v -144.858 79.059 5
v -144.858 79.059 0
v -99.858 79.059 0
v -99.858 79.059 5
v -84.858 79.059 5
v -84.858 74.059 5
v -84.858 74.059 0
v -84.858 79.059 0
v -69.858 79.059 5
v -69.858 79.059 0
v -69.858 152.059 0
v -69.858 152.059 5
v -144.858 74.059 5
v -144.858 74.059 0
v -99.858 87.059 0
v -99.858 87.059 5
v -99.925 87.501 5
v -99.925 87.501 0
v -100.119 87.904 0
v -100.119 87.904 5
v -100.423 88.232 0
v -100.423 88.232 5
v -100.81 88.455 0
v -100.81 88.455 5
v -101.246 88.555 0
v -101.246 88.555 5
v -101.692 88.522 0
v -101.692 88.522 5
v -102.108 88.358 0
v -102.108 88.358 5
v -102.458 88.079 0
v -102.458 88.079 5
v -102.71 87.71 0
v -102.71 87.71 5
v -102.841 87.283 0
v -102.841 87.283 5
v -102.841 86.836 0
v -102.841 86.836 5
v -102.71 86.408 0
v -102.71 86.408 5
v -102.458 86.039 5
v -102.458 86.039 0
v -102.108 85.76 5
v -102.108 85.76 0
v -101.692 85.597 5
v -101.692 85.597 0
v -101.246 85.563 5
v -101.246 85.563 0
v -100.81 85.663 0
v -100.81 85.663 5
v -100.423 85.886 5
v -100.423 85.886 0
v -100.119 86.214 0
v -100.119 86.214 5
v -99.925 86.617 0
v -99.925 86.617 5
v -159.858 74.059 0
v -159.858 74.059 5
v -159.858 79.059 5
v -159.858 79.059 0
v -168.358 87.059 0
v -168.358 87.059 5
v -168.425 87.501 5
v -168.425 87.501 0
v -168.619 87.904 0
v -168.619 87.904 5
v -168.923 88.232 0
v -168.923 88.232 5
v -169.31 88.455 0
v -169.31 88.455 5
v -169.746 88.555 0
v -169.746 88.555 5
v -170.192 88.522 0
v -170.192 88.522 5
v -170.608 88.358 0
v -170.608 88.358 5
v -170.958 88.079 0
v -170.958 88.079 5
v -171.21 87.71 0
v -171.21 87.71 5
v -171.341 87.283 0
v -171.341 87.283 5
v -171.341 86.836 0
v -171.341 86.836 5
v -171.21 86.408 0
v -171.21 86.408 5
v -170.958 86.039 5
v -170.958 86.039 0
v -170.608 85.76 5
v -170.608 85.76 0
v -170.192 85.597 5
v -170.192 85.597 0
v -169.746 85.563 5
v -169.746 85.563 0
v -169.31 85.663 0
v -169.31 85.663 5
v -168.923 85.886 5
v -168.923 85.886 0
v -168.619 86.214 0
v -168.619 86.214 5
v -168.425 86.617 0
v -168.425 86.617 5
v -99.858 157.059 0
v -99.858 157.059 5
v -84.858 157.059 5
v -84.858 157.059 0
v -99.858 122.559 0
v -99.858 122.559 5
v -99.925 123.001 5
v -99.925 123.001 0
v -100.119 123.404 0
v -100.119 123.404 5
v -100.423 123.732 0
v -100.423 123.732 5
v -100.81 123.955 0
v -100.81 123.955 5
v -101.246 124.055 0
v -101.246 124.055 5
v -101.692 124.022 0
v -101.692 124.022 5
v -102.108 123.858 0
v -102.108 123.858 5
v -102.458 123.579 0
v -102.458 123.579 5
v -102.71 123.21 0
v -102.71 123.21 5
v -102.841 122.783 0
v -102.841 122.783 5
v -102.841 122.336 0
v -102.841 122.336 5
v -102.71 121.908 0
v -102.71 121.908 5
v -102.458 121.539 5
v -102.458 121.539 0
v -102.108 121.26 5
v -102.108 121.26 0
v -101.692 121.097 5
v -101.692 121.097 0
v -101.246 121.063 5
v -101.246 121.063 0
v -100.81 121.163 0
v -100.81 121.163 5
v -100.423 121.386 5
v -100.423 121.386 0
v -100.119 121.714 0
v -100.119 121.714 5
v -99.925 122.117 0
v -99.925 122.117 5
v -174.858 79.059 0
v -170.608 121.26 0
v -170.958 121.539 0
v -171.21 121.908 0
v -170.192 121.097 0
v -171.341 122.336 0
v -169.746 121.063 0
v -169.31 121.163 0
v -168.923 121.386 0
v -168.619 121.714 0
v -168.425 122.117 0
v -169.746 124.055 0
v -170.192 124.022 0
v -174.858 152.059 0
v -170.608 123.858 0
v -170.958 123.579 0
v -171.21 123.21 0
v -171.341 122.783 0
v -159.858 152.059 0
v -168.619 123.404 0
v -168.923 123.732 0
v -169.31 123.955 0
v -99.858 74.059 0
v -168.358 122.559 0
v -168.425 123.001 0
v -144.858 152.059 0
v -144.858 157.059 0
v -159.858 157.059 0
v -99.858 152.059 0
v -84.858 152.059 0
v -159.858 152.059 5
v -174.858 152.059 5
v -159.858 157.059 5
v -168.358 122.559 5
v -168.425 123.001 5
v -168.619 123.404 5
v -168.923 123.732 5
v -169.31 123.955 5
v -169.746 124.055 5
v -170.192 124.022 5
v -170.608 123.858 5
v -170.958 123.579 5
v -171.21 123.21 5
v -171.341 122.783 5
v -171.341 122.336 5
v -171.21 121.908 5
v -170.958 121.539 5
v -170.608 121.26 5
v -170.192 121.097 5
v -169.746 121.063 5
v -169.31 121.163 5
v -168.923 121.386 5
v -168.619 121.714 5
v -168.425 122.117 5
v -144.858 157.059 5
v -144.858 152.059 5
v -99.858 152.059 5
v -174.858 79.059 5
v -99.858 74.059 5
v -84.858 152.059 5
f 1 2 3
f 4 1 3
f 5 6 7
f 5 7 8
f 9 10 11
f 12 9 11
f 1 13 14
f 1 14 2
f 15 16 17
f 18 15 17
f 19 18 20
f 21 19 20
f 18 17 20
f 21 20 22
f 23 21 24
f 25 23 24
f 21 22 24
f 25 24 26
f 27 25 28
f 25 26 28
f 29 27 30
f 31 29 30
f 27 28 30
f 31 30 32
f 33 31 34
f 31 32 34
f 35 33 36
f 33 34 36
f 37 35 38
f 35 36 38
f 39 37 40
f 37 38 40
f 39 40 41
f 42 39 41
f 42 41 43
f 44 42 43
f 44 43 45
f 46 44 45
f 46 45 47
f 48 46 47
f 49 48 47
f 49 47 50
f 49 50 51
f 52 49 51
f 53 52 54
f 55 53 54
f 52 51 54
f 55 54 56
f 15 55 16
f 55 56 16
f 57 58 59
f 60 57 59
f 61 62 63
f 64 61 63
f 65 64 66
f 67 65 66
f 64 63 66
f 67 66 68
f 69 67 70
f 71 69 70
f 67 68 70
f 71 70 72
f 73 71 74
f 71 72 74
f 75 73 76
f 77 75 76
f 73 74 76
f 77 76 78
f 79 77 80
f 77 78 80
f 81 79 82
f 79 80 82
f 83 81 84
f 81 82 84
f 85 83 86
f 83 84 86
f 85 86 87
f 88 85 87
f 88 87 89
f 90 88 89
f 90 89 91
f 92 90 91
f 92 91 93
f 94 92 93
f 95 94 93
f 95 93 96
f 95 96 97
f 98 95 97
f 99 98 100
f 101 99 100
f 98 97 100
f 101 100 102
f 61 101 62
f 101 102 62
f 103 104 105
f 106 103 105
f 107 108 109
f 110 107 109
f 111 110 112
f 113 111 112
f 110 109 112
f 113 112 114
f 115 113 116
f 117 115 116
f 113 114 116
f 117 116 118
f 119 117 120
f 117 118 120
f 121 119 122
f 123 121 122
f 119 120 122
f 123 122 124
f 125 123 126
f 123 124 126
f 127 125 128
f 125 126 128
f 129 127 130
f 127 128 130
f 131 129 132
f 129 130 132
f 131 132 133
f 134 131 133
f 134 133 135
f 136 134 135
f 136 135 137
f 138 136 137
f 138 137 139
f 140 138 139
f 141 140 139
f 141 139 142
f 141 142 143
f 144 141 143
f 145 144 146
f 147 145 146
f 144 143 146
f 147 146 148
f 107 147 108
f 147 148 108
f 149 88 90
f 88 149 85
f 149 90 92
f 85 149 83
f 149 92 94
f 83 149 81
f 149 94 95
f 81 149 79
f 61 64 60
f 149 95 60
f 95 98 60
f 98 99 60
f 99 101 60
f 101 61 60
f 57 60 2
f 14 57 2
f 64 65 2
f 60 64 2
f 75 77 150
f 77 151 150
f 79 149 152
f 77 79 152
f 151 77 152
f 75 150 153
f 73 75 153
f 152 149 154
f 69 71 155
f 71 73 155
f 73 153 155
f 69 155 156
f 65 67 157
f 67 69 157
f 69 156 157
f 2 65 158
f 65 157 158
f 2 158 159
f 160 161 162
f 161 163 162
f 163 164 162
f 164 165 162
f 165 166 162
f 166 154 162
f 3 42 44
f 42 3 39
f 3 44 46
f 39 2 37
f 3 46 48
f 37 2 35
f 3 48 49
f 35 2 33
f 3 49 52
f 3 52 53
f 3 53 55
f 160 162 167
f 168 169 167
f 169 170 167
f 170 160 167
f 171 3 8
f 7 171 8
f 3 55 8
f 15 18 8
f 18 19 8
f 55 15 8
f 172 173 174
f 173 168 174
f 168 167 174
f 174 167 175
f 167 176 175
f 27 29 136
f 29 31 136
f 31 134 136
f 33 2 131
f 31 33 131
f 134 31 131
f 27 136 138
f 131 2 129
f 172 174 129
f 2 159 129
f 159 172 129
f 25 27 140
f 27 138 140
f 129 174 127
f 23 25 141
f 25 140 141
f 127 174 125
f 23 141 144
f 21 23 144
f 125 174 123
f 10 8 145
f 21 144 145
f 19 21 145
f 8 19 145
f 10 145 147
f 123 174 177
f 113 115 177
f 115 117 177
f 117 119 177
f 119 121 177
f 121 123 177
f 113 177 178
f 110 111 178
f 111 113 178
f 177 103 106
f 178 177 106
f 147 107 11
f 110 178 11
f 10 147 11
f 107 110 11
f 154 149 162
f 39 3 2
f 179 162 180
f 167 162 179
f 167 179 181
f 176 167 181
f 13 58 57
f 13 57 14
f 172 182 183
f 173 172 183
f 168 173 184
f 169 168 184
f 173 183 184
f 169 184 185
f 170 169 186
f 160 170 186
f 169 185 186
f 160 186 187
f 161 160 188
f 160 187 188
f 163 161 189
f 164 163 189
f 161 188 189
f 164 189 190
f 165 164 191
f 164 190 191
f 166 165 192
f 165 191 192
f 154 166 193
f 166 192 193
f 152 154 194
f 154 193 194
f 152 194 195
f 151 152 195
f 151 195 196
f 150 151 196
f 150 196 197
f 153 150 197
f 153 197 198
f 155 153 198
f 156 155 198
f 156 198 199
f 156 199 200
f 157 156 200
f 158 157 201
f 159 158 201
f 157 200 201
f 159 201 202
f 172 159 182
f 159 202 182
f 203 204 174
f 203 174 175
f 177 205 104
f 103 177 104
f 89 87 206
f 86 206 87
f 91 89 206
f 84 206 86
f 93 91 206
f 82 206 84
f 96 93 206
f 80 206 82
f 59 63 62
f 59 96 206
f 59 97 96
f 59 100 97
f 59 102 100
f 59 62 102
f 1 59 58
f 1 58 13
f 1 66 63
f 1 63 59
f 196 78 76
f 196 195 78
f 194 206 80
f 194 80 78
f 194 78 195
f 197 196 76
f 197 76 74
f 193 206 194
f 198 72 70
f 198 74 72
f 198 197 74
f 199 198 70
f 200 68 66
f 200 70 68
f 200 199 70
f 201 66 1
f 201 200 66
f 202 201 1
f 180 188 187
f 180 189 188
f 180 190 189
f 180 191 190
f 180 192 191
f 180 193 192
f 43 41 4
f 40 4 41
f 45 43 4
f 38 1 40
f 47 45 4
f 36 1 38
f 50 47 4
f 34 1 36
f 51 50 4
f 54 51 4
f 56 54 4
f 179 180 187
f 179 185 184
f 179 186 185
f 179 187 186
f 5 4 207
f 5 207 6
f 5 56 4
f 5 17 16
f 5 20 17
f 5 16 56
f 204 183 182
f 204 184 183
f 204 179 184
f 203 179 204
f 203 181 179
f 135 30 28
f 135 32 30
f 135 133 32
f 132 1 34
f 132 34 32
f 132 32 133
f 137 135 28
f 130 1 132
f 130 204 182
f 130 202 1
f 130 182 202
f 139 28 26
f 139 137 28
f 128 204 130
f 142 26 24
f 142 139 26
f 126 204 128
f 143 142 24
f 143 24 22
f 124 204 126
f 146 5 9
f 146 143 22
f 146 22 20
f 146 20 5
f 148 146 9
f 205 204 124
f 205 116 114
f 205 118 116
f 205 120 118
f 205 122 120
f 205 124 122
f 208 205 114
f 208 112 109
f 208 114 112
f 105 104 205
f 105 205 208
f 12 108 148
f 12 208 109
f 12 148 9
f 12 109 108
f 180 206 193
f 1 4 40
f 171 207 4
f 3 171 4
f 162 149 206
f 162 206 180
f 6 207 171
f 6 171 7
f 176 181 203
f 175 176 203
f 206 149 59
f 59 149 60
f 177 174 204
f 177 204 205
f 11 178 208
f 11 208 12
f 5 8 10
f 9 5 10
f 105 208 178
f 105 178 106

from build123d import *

# Parameters (mm, degrees)
ESQUISSE1_W             = 105
ESQUISSE1_H             = 73
BOSS_EXTRU_1_DEPTH      = 5
ESQUISSE2_R             = 1.5
ENL_V_MAT_EXTRU_1_DEPTH = 5
ESQUISSE3_W             = 15
ESQUISSE3_H             = 5
BOSS_EXTRU_2_DEPTH      = 5


with BuildPart() as part:
    # Esquisse1 → Boss.-Extru.1 (new body)
    with BuildSketch(Plane.XY):
        with Locations((-122.358209677, 115.559145013)):
            Rectangle(ESQUISSE1_W, ESQUISSE1_H)
    extrude(amount=BOSS_EXTRU_1_DEPTH)

    # Esquisse2 → Enlèv. mat.-Extru.1 (cut)
    with BuildSketch(Plane.XY.offset(5)):
        with Locations((-101.358209677, 122.559145013)):
            Circle(ESQUISSE2_R)
        with Locations((-169.858209677, 122.559145013)):
            Circle(ESQUISSE2_R)
        with Locations((-169.858209677, 87.059145013)):
            Circle(ESQUISSE2_R)
        with Locations((-101.358209677, 87.059145013)):
            Circle(ESQUISSE2_R)
    extrude(amount=-ENL_V_MAT_EXTRU_1_DEPTH, mode=Mode.SUBTRACT)

    # Esquisse3 → Boss.-Extru.2 (add)
    with BuildSketch(Plane.XY.offset(5)):
        with Locations((-152.358209677, 76.559145013)):
            Rectangle(ESQUISSE3_W, ESQUISSE3_H)
        with Locations((-92.358209677, 76.559145013)):
            Rectangle(ESQUISSE3_W, ESQUISSE3_H)
        with Locations((-92.358209677, 154.559145013)):
            Rectangle(ESQUISSE3_W, ESQUISSE3_H)
        with Locations((-152.358209677, 154.559145013)):
            Rectangle(ESQUISSE3_W, ESQUISSE3_H)
    extrude(amount=-BOSS_EXTRU_2_DEPTH)


solid = part.part
